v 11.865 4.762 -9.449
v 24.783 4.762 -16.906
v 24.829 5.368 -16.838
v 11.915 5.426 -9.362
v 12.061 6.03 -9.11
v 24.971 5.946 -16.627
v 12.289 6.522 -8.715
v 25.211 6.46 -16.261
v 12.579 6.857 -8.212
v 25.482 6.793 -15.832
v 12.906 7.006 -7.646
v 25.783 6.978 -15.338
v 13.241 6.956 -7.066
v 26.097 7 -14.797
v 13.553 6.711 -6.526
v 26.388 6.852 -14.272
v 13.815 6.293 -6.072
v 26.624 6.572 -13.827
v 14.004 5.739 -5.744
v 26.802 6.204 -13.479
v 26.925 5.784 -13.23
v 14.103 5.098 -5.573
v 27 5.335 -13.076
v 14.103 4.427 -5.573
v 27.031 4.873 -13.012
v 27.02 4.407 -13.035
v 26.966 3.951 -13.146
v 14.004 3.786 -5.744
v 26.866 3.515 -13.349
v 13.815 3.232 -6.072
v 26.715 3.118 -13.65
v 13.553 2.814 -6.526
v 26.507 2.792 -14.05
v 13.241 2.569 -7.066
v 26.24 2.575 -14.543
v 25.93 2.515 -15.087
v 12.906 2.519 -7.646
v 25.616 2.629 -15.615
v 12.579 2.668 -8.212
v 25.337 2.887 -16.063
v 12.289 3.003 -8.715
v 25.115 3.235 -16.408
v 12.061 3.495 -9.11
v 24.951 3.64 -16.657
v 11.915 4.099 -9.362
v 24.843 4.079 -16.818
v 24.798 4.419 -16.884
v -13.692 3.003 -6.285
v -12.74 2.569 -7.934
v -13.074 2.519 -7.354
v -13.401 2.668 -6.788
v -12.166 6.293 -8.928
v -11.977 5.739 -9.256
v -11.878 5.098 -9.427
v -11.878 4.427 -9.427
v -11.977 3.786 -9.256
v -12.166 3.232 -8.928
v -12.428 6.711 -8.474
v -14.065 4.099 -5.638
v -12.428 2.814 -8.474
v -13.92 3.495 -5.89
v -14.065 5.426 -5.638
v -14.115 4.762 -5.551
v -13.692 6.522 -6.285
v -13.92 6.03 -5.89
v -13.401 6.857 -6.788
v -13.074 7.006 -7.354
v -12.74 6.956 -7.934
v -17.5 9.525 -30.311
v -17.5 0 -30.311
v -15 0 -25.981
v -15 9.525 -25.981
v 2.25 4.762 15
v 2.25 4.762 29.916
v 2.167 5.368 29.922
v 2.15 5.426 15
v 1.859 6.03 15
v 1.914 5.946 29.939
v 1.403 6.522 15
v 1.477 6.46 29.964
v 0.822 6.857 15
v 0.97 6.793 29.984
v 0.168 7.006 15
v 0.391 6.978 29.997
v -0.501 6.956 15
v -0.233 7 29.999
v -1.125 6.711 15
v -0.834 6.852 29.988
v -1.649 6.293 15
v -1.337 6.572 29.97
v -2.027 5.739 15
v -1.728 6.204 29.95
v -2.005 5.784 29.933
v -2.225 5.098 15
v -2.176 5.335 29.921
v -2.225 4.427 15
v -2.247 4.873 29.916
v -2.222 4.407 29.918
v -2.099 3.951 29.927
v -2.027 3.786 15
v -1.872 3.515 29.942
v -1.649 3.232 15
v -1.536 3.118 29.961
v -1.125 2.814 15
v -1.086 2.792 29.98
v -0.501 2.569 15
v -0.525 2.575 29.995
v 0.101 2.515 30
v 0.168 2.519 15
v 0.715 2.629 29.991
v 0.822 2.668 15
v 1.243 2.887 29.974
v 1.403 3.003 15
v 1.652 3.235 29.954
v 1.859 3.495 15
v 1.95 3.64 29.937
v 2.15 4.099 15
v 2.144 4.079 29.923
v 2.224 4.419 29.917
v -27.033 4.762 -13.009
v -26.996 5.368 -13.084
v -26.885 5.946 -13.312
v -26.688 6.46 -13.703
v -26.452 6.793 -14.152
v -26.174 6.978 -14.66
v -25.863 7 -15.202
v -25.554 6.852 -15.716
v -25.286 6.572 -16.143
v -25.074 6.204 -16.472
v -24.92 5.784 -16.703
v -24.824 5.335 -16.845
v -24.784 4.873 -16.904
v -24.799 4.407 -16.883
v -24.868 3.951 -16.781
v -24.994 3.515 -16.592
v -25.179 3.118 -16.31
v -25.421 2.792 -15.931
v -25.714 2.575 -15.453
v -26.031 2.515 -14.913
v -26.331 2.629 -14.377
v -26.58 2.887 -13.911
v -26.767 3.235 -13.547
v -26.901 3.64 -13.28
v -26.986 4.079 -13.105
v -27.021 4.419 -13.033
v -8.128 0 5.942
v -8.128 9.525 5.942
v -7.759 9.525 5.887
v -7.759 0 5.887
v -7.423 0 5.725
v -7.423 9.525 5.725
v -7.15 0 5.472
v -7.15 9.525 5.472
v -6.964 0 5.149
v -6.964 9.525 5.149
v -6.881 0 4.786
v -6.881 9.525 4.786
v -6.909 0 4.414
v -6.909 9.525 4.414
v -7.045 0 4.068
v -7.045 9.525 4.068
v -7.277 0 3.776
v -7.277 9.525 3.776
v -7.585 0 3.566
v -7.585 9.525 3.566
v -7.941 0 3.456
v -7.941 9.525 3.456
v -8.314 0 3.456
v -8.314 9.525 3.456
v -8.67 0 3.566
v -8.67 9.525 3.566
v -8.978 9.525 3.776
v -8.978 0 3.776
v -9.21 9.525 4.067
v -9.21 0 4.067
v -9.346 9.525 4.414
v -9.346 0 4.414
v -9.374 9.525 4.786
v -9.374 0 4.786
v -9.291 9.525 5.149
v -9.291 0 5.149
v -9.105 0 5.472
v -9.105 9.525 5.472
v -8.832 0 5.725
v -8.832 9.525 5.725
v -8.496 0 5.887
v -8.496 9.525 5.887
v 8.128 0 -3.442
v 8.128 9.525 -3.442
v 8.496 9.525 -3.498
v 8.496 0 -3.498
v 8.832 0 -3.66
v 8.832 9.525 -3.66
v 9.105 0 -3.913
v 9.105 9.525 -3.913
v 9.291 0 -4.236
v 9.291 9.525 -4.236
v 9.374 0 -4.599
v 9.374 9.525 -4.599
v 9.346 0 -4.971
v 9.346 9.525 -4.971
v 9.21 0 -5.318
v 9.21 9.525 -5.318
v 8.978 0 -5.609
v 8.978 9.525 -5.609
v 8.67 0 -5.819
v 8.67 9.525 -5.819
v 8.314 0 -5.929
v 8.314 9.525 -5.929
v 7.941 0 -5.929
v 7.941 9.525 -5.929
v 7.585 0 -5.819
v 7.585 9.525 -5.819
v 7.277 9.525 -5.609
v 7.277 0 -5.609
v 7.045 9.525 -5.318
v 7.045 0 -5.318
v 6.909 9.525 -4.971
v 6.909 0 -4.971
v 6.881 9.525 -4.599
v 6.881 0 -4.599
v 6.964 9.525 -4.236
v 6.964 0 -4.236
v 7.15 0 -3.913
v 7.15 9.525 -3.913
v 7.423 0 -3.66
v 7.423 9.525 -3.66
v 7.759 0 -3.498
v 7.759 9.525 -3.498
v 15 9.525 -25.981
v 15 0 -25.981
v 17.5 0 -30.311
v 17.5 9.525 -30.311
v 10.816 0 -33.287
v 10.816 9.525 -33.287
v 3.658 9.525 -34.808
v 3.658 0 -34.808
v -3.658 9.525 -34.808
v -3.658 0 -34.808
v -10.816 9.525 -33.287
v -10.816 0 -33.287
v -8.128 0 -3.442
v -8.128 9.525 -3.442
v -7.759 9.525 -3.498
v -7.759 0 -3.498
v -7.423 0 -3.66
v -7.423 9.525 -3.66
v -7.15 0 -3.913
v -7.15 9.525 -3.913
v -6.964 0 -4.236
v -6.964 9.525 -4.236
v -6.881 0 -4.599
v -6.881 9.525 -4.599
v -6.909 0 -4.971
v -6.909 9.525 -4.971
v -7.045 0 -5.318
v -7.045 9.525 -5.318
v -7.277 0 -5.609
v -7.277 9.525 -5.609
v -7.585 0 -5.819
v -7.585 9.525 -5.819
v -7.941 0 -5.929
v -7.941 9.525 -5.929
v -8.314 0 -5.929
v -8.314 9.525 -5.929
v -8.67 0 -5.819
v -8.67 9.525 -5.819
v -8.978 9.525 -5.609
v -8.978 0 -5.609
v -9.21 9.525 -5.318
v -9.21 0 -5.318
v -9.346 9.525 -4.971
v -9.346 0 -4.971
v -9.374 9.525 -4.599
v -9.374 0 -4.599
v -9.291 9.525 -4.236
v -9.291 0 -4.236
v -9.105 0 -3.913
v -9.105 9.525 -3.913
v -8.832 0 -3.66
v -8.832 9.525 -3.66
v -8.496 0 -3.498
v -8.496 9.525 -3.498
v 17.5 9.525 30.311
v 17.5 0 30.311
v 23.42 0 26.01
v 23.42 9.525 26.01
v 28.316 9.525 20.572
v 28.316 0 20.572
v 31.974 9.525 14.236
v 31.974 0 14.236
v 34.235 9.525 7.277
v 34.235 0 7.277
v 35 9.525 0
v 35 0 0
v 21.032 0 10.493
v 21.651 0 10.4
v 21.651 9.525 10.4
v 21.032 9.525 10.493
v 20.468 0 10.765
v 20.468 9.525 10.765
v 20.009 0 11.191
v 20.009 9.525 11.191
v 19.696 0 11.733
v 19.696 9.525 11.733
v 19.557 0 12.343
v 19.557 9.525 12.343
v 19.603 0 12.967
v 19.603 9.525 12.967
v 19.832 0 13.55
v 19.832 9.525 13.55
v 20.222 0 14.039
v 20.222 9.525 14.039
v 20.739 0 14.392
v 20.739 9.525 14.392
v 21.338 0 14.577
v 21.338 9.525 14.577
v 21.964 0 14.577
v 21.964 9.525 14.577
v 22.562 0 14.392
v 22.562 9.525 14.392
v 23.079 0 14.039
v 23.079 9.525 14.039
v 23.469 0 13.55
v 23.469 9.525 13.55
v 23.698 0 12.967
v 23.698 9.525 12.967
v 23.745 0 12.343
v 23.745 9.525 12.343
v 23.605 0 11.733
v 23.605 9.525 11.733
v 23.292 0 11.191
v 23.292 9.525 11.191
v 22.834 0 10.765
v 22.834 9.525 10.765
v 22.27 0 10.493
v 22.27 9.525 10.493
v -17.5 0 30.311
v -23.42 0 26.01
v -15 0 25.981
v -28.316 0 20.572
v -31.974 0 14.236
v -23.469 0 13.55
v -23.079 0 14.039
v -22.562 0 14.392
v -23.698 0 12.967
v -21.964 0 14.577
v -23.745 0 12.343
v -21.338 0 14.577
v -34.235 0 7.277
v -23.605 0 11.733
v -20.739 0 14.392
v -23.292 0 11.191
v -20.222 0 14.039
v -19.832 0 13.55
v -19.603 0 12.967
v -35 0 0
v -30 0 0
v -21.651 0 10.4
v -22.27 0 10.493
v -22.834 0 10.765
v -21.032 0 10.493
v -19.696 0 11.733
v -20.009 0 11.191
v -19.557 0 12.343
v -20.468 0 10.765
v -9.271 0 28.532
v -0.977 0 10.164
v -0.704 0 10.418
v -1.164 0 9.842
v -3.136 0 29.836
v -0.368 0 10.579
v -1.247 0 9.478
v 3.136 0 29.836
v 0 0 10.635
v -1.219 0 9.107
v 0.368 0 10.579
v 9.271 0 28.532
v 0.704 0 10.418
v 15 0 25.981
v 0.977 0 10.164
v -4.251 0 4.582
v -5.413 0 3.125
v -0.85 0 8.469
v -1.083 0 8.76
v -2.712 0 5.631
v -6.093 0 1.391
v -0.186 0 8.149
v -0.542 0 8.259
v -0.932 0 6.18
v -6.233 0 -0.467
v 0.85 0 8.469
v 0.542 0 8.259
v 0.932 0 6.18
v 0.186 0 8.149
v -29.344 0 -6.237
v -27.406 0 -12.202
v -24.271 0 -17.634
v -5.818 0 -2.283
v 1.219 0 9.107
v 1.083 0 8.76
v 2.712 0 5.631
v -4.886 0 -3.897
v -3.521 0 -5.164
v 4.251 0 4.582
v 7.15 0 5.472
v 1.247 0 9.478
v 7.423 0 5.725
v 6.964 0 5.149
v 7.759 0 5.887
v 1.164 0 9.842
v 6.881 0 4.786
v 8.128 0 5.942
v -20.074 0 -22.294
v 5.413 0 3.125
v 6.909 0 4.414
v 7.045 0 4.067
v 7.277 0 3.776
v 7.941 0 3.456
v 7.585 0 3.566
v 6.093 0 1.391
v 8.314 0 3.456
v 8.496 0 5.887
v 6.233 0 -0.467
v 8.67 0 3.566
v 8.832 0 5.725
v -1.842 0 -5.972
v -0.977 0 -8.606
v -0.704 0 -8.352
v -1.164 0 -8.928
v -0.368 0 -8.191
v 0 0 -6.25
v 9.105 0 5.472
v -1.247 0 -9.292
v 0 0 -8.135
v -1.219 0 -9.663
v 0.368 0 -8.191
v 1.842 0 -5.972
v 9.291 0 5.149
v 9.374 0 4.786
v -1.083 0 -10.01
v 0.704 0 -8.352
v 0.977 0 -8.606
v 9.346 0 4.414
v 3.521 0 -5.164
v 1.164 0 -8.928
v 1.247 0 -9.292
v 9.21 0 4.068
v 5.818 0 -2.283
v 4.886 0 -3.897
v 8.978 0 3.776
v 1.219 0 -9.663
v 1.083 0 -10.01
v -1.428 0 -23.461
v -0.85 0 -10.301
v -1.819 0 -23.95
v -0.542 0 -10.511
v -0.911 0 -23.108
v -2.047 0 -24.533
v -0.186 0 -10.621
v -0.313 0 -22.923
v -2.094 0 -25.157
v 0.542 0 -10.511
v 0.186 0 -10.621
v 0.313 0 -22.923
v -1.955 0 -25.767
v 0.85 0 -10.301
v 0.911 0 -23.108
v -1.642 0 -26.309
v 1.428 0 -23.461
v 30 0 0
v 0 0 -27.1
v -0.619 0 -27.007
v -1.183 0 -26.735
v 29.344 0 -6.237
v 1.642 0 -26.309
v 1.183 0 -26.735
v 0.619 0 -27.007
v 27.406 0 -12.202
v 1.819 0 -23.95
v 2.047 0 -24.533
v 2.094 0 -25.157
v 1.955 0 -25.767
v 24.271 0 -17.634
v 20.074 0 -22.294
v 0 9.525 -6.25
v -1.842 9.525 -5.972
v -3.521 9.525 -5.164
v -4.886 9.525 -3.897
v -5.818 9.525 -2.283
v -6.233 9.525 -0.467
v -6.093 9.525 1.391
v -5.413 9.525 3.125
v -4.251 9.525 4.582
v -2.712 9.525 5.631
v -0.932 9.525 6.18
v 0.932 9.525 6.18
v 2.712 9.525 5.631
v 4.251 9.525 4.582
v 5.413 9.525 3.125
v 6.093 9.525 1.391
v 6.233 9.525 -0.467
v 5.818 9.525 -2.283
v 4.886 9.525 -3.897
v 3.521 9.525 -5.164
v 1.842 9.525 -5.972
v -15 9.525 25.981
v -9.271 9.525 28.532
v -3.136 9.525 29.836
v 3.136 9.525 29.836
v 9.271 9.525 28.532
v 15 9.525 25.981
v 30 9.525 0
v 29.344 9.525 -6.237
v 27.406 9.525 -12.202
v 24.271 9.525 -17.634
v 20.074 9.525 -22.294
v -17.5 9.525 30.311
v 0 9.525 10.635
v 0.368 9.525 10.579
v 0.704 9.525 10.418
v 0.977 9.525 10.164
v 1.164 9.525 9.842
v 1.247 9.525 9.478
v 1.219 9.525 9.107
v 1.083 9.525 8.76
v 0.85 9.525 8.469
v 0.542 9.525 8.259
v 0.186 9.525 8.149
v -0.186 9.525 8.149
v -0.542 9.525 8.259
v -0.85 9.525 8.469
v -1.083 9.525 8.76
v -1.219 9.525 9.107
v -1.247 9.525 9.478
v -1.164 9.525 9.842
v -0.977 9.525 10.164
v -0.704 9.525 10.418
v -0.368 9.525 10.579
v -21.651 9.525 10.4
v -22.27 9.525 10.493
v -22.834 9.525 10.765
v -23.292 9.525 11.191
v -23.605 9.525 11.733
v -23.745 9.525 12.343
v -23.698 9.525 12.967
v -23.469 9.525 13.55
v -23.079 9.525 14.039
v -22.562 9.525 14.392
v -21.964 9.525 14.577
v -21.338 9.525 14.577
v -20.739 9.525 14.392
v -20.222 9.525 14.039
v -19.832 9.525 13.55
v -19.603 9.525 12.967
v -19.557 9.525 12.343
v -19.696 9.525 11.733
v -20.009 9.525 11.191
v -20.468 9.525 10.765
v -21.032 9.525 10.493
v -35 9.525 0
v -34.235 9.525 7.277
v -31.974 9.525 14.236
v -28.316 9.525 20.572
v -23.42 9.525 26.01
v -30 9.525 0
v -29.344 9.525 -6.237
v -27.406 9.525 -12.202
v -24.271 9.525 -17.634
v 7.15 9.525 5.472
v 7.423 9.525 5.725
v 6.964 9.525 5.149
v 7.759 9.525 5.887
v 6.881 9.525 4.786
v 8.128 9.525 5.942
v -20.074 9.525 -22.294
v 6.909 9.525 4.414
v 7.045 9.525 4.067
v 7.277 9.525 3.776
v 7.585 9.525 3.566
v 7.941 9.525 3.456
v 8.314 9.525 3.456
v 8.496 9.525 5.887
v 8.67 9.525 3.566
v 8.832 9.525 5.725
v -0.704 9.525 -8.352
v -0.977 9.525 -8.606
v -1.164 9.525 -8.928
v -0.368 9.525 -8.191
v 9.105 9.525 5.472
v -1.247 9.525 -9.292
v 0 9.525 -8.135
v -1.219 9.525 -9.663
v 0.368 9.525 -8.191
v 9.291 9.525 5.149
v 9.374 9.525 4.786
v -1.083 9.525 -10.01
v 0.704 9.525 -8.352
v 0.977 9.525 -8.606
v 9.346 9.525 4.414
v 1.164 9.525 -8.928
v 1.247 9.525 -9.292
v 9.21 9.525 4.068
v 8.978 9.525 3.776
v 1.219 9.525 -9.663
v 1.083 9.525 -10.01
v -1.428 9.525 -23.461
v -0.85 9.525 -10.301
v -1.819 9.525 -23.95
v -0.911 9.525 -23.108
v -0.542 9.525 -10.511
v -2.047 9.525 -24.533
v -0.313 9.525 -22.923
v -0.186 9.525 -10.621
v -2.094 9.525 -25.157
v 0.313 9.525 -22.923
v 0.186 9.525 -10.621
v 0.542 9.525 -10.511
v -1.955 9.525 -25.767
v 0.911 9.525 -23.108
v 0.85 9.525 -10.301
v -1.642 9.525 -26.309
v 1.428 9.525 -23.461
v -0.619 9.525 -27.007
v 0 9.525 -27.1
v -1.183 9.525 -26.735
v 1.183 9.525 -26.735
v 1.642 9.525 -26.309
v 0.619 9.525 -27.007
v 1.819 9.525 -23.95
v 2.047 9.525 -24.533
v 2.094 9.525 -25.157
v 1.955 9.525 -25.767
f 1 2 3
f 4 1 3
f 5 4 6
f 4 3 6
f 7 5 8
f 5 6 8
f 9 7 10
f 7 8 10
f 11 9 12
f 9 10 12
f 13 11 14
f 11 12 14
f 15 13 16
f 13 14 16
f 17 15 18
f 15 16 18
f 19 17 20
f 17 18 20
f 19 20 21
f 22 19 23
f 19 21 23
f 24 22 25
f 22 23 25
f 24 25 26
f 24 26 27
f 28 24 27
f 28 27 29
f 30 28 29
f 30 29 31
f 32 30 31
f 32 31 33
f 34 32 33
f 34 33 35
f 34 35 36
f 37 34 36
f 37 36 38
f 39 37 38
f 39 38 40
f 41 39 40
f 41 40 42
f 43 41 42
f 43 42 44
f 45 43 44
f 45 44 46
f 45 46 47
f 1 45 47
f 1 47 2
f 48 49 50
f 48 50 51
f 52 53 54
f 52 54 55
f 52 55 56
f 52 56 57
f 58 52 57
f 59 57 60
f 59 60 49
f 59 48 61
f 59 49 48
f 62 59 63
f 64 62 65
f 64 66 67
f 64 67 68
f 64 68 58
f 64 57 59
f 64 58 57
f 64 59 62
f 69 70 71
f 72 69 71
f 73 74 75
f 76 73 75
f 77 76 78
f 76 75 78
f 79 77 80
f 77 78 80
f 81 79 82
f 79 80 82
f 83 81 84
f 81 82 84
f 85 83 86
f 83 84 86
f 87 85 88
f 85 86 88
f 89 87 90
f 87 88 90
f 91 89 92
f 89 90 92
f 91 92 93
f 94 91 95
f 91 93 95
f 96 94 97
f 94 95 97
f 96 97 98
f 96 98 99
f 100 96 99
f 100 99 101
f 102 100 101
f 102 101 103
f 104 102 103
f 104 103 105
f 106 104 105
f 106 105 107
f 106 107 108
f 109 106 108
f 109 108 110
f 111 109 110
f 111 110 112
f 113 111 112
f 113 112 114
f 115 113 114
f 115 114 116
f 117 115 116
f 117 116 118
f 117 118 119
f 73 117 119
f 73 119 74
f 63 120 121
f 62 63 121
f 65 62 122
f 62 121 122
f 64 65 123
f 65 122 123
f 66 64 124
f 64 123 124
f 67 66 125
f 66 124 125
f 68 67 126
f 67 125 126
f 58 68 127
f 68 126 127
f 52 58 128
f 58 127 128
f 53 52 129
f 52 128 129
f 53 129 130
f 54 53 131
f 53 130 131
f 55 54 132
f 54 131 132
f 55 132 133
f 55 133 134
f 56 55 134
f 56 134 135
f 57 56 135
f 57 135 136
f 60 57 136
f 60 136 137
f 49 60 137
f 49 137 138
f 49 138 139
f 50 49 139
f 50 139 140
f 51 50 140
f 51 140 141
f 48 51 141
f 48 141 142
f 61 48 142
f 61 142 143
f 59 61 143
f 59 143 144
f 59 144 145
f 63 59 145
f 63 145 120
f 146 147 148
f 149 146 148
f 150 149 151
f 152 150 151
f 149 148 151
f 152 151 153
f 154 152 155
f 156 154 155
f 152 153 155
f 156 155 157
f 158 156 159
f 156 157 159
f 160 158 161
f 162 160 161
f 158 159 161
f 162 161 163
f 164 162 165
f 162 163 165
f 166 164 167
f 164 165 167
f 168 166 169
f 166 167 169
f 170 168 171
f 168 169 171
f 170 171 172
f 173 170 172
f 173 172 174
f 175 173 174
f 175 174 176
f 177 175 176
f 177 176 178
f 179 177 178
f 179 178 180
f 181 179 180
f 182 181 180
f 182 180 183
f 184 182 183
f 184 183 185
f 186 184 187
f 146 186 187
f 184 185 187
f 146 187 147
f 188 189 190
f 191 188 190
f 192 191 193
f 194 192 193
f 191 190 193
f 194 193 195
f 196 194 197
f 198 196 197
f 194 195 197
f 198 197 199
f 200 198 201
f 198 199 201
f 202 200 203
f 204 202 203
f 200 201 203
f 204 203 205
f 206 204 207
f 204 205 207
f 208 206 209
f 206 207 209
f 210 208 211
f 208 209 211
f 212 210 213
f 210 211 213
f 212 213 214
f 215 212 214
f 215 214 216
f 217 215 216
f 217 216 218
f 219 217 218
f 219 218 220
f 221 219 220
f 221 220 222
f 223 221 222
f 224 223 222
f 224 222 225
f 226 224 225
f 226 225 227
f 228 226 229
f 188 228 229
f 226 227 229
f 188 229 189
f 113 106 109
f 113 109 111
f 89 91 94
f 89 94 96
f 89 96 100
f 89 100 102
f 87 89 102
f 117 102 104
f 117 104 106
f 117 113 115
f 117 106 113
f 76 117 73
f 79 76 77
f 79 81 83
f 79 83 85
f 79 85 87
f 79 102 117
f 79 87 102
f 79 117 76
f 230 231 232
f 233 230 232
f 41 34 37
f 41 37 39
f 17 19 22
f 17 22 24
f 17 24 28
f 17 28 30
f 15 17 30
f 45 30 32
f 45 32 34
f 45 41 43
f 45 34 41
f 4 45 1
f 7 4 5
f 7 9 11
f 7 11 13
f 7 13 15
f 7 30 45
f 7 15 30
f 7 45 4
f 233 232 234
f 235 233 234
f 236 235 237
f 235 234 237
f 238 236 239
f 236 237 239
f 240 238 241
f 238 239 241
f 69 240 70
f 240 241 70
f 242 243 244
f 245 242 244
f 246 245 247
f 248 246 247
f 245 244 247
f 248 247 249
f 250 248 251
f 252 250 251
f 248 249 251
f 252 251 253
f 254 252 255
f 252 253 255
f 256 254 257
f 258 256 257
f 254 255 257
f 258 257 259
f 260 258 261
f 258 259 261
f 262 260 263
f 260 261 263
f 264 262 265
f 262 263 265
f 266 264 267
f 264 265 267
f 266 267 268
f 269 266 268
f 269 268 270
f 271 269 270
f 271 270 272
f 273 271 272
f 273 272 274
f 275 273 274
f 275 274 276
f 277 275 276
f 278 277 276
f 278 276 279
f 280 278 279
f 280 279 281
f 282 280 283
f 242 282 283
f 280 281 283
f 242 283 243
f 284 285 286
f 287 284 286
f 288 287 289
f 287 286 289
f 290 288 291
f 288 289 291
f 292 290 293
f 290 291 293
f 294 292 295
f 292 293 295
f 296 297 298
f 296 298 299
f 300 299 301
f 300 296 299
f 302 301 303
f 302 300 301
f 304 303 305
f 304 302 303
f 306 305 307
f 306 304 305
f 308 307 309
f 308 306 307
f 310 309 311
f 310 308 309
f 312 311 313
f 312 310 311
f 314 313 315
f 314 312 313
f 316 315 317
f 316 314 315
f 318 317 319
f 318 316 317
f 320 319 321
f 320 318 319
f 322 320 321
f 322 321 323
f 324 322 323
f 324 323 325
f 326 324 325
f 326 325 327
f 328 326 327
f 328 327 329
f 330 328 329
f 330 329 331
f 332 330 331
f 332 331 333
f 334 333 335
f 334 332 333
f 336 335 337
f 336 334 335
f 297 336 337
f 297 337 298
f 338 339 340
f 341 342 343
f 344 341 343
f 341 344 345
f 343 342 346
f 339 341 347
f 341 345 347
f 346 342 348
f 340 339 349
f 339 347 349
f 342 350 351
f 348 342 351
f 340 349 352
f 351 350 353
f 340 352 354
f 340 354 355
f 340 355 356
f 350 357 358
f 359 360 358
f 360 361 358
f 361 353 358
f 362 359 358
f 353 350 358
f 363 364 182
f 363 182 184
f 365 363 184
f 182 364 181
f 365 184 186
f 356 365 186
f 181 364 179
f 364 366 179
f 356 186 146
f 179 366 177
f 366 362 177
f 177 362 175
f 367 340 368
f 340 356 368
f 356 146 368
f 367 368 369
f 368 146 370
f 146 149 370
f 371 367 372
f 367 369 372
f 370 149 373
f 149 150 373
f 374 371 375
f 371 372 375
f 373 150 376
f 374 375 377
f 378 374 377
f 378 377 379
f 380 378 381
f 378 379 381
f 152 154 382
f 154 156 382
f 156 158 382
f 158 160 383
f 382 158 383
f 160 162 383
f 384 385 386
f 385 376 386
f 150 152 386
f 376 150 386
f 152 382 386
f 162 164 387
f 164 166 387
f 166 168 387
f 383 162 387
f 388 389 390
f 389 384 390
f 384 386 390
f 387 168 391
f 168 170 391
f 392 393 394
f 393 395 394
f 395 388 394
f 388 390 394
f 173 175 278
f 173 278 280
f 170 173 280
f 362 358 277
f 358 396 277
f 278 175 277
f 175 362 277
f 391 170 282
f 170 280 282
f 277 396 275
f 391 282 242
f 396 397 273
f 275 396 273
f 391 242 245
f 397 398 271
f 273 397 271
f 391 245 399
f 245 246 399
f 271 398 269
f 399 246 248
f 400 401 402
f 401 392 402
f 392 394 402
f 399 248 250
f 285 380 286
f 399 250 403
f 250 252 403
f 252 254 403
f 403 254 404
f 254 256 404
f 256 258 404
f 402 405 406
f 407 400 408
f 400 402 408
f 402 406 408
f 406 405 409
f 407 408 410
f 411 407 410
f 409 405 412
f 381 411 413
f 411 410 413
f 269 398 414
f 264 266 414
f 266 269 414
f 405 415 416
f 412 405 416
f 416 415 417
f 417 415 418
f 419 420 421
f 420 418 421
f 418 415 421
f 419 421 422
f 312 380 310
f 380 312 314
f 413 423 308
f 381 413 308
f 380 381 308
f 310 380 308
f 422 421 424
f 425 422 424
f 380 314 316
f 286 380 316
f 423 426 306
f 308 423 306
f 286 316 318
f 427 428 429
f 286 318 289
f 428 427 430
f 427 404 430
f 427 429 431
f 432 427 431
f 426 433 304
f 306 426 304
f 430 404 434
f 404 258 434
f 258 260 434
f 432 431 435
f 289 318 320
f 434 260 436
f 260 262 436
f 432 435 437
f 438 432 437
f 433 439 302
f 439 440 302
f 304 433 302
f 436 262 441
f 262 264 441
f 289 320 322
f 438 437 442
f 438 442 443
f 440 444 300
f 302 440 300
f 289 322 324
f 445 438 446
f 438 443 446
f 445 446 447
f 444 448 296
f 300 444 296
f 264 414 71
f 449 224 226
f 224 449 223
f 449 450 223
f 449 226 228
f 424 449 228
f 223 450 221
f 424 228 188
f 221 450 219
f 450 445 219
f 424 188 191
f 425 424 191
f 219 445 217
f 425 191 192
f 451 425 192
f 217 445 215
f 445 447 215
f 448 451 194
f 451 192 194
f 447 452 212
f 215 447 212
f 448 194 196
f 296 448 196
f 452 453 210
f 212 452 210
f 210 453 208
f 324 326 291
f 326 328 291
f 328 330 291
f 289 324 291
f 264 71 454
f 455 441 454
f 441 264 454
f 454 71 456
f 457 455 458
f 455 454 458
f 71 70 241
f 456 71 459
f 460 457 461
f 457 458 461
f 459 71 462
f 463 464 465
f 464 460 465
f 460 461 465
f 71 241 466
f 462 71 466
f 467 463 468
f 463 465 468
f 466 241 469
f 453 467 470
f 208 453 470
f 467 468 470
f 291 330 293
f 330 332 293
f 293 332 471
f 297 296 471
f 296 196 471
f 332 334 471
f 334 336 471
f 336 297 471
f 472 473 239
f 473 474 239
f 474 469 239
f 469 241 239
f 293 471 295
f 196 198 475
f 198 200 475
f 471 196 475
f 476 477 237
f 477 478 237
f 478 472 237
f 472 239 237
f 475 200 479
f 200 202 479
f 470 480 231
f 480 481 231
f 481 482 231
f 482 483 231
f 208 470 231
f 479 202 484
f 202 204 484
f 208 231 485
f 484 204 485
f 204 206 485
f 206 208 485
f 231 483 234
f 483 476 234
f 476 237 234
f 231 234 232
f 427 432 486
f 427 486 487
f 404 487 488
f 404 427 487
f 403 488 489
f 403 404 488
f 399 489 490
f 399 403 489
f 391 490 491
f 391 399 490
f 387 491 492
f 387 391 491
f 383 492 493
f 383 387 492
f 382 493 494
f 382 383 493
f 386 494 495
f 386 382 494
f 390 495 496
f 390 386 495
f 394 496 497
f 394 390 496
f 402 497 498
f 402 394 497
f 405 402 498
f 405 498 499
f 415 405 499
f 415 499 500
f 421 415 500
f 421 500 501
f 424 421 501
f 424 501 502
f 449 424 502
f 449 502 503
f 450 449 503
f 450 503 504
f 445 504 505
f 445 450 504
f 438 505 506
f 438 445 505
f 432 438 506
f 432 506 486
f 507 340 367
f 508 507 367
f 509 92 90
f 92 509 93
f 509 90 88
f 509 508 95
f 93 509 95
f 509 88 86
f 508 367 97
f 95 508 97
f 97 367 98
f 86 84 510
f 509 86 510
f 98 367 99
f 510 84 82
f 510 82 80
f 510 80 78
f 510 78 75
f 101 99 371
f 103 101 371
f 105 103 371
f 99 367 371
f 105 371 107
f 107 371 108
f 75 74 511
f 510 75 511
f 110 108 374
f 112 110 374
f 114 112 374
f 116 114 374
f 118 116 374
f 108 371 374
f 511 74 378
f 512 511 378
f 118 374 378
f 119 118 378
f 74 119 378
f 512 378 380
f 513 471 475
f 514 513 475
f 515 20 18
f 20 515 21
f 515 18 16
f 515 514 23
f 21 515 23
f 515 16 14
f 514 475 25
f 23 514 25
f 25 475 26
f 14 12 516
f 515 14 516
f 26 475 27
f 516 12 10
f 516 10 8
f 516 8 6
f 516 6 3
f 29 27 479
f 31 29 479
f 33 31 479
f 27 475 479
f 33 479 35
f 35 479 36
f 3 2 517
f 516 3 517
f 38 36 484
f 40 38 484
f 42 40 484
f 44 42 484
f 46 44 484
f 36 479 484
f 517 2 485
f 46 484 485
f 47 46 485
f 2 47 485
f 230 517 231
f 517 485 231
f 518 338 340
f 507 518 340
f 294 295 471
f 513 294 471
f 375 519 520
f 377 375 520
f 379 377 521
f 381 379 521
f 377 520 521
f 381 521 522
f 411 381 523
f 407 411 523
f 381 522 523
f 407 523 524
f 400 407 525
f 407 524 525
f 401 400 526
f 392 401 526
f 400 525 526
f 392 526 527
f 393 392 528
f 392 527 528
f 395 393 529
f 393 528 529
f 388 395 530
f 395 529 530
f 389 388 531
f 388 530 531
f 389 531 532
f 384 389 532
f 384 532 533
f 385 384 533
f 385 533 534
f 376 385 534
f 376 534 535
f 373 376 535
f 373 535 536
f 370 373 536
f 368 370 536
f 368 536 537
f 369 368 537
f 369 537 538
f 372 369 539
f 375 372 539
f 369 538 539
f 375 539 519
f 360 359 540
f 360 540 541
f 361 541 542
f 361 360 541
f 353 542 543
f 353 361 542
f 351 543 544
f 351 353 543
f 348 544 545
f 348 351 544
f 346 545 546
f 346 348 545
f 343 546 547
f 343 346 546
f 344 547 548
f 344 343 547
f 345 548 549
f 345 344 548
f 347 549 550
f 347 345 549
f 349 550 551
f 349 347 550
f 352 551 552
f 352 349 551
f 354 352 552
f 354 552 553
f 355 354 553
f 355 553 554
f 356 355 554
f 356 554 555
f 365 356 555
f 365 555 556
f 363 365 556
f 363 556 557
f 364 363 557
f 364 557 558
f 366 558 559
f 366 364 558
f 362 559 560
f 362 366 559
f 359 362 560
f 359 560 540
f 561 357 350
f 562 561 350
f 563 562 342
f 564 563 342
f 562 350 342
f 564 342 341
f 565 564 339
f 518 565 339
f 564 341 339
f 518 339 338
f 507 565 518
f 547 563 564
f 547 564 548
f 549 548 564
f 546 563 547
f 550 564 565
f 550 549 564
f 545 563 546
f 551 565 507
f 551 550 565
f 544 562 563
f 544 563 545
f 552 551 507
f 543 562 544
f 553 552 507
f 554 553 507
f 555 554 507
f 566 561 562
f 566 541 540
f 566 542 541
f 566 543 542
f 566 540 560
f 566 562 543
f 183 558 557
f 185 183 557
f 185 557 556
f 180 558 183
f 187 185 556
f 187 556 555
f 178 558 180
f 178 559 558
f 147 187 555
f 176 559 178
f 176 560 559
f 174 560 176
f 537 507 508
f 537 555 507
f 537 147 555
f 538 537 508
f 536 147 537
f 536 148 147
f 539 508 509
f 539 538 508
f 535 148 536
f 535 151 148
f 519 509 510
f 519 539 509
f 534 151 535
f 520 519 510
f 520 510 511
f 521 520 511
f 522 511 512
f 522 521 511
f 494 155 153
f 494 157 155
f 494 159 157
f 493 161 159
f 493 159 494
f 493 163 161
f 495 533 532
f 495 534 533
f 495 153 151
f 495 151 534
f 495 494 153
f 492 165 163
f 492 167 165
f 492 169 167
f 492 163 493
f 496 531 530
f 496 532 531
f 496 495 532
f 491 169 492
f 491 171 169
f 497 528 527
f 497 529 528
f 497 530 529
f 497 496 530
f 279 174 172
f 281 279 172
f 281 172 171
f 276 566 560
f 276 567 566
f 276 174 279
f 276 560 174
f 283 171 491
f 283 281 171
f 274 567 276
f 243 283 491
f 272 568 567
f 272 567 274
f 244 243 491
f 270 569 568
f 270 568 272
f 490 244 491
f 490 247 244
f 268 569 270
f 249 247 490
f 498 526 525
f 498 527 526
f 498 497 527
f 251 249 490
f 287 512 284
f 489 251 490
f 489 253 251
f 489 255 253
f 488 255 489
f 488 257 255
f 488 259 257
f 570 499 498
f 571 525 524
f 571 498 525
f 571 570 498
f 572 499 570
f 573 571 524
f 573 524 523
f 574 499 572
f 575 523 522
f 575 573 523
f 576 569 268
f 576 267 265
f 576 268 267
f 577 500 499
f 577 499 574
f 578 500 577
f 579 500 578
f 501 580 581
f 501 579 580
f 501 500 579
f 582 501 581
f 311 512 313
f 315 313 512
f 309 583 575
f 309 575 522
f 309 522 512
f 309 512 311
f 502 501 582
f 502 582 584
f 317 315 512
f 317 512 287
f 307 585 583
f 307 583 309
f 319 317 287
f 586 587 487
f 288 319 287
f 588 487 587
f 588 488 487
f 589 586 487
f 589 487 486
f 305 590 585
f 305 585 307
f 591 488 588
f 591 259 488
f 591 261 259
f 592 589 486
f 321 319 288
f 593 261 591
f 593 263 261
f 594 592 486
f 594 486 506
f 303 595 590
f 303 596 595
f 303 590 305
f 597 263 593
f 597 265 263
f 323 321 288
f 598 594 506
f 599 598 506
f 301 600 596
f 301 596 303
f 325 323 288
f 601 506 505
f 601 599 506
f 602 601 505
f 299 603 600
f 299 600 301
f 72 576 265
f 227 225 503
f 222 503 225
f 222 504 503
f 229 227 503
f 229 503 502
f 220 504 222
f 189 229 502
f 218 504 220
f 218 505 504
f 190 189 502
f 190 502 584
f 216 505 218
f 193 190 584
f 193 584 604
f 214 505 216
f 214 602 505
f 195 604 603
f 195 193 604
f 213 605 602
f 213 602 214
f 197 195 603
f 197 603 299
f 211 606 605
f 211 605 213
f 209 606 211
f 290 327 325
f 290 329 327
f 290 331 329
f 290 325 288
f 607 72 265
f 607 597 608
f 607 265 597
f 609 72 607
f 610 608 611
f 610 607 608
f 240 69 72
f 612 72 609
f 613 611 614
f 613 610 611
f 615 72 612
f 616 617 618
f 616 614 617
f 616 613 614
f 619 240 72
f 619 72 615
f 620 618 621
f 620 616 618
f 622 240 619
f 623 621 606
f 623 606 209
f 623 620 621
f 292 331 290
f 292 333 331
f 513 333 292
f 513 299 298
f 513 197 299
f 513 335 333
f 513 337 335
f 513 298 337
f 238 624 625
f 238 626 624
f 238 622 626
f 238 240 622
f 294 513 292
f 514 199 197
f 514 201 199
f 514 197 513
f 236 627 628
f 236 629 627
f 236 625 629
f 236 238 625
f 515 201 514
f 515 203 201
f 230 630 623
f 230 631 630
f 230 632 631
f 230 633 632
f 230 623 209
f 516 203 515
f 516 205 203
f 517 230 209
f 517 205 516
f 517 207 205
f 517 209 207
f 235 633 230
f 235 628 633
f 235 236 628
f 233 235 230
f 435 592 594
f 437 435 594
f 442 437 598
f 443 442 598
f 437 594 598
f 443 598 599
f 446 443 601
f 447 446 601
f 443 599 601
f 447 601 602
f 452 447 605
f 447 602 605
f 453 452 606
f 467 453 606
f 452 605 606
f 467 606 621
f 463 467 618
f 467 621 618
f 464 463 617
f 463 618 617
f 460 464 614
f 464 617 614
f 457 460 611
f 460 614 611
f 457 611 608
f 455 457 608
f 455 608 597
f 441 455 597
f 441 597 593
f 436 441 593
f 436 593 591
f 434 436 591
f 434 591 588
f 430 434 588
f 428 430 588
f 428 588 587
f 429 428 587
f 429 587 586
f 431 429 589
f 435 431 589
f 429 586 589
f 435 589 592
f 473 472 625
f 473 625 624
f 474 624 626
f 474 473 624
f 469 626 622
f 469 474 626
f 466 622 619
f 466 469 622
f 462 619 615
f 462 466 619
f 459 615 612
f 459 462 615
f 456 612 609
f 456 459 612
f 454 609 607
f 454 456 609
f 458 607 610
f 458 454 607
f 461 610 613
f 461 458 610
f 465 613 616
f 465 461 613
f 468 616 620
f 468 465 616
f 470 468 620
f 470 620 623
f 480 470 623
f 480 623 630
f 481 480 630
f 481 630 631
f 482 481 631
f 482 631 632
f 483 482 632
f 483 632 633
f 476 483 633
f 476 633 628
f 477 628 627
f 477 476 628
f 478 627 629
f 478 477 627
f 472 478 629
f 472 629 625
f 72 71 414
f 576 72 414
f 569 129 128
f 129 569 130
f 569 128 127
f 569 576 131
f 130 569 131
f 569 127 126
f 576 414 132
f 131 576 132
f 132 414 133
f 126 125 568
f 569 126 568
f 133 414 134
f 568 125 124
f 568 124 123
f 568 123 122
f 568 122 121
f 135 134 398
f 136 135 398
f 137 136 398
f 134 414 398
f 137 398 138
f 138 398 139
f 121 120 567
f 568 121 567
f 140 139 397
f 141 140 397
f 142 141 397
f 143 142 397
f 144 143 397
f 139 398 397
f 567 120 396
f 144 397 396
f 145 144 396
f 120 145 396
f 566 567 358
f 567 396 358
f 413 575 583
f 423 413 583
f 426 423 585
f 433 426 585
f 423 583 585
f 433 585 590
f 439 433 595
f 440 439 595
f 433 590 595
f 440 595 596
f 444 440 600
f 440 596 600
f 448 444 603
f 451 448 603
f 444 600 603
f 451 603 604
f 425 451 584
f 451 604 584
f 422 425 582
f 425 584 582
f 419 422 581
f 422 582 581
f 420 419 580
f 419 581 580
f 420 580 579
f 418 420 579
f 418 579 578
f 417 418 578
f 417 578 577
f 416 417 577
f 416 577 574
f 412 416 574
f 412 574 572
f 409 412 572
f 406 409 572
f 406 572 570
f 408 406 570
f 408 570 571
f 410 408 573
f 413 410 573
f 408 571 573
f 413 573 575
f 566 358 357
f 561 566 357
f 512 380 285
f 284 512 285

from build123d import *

# Parameters (mm, degrees)
BASEPLATE_SKETCH_R   = 2.1
BASEPLATE_SKETCH_R_2 = 6.25
BOSS_EXTRUDE1_DEPTH  = 9.525
SKETCH2_R            = 2.25
CUT_EXTRUDE1_DEPTH   = 25
CIRPATTERN1_COUNT    = 3
SKETCH3_R            = 1.25
CUT_EXTRUDE2_DEPTH   = 9.525


with BuildPart() as part:
    # Baseplate Sketch → Boss-Extrude1 (new body)
    with BuildSketch(Plane(origin=(0, 0, 0), x_dir=(1, 0, 0), z_dir=(0, 1, 0))):
        with BuildLine():
            ThreePointArc((17.5, 30.310889132), (0, 35), (-17.5, 30.310889132))
            Line((-17.5, 30.310889132), (-15, 25.980762114))
            ThreePointArc((-15, 25.980762114), (-25.980762114, 15), (-30, 0))
            Line((-30, 0), (-35, 0))
            ThreePointArc((-35, 0), (-30.310889132, -17.5), (-17.5, -30.310889132))
            Line((-17.5, -30.310889132), (-15, -25.980762114))
            ThreePointArc((-15, -25.980762114), (0, -30), (15, -25.980762114))
            Line((15, -25.980762114), (17.5, -30.310889132))
            ThreePointArc((17.5, -30.310889132), (30.310889132, -17.5), (35, 0))
            Line((35, 0), (30, 0))
            ThreePointArc((30, 0), (25.980762114, 15), (15, 25.980762114))
            Line((15, 25.980762114), (17.5, 30.310889132))
        make_face()
        with Locations(Location((0, 25, 0), (0, 0, 90))):
            Circle(BASEPLATE_SKETCH_R, mode=Mode.SUBTRACT)
        with Locations(Location((-21.650635095, -12.5, 0), (0, 0, 90))):
            Circle(BASEPLATE_SKETCH_R, mode=Mode.SUBTRACT)
        with Locations(Location((0, 0, 0), (0, 0, 90))):
            Circle(BASEPLATE_SKETCH_R_2, mode=Mode.SUBTRACT)
        with Locations(Location((21.650635095, -12.5, 0), (0, 0, 90))):
            Circle(BASEPLATE_SKETCH_R, mode=Mode.SUBTRACT)
    extrude(amount=BOSS_EXTRUDE1_DEPTH)

    # Sketch2 → Cut-Extrude1 (cut)
    with BuildSketch(Plane.XY.offset(40)):
        with Locations((0, 4.7625)):
            Circle(SKETCH2_R)
    cut_extrude1 = extrude(amount=-CUT_EXTRUDE1_DEPTH, mode=Mode.SUBTRACT)

    # CirPattern1: Cut-Extrude1 ×3 about axis
    cirpattern1_axis = Axis((0, 0, 0), (0, 1, 0))
    for i in range(1, CIRPATTERN1_COUNT):
        add(cut_extrude1.rotate(cirpattern1_axis, i * 360 / CIRPATTERN1_COUNT), mode=Mode.SUBTRACT)

    # Sketch3 → Cut-Extrude2 (cut)
    with BuildSketch(Plane(origin=(0, 9.525, 0), x_dir=(1, 0, 0), z_dir=(0, 1, 0))):
        with Locations(Location((-8.127648415, -4.6925, 0), (0, 0, 270))):
            Circle(SKETCH3_R)
        with Locations(Location((0, -9.385, 0), (0, 0, 270))):
            Circle(SKETCH3_R)
        with Locations(Location((-8.127648415, 4.6925, 0), (0, 0, 270))):
            Circle(SKETCH3_R)
        with Locations(Location((0, 9.385, 0), (0, 0, 270))):
            Circle(SKETCH3_R)
        with Locations(Location((8.127648415, 4.6925, 0), (0, 0, 270))):
            Circle(SKETCH3_R)
        with Locations(Location((8.127648415, -4.6925, 0), (0, 0, 270))):
            Circle(SKETCH3_R)
    extrude(amount=-CUT_EXTRUDE2_DEPTH, mode=Mode.SUBTRACT)


solid = part.part
